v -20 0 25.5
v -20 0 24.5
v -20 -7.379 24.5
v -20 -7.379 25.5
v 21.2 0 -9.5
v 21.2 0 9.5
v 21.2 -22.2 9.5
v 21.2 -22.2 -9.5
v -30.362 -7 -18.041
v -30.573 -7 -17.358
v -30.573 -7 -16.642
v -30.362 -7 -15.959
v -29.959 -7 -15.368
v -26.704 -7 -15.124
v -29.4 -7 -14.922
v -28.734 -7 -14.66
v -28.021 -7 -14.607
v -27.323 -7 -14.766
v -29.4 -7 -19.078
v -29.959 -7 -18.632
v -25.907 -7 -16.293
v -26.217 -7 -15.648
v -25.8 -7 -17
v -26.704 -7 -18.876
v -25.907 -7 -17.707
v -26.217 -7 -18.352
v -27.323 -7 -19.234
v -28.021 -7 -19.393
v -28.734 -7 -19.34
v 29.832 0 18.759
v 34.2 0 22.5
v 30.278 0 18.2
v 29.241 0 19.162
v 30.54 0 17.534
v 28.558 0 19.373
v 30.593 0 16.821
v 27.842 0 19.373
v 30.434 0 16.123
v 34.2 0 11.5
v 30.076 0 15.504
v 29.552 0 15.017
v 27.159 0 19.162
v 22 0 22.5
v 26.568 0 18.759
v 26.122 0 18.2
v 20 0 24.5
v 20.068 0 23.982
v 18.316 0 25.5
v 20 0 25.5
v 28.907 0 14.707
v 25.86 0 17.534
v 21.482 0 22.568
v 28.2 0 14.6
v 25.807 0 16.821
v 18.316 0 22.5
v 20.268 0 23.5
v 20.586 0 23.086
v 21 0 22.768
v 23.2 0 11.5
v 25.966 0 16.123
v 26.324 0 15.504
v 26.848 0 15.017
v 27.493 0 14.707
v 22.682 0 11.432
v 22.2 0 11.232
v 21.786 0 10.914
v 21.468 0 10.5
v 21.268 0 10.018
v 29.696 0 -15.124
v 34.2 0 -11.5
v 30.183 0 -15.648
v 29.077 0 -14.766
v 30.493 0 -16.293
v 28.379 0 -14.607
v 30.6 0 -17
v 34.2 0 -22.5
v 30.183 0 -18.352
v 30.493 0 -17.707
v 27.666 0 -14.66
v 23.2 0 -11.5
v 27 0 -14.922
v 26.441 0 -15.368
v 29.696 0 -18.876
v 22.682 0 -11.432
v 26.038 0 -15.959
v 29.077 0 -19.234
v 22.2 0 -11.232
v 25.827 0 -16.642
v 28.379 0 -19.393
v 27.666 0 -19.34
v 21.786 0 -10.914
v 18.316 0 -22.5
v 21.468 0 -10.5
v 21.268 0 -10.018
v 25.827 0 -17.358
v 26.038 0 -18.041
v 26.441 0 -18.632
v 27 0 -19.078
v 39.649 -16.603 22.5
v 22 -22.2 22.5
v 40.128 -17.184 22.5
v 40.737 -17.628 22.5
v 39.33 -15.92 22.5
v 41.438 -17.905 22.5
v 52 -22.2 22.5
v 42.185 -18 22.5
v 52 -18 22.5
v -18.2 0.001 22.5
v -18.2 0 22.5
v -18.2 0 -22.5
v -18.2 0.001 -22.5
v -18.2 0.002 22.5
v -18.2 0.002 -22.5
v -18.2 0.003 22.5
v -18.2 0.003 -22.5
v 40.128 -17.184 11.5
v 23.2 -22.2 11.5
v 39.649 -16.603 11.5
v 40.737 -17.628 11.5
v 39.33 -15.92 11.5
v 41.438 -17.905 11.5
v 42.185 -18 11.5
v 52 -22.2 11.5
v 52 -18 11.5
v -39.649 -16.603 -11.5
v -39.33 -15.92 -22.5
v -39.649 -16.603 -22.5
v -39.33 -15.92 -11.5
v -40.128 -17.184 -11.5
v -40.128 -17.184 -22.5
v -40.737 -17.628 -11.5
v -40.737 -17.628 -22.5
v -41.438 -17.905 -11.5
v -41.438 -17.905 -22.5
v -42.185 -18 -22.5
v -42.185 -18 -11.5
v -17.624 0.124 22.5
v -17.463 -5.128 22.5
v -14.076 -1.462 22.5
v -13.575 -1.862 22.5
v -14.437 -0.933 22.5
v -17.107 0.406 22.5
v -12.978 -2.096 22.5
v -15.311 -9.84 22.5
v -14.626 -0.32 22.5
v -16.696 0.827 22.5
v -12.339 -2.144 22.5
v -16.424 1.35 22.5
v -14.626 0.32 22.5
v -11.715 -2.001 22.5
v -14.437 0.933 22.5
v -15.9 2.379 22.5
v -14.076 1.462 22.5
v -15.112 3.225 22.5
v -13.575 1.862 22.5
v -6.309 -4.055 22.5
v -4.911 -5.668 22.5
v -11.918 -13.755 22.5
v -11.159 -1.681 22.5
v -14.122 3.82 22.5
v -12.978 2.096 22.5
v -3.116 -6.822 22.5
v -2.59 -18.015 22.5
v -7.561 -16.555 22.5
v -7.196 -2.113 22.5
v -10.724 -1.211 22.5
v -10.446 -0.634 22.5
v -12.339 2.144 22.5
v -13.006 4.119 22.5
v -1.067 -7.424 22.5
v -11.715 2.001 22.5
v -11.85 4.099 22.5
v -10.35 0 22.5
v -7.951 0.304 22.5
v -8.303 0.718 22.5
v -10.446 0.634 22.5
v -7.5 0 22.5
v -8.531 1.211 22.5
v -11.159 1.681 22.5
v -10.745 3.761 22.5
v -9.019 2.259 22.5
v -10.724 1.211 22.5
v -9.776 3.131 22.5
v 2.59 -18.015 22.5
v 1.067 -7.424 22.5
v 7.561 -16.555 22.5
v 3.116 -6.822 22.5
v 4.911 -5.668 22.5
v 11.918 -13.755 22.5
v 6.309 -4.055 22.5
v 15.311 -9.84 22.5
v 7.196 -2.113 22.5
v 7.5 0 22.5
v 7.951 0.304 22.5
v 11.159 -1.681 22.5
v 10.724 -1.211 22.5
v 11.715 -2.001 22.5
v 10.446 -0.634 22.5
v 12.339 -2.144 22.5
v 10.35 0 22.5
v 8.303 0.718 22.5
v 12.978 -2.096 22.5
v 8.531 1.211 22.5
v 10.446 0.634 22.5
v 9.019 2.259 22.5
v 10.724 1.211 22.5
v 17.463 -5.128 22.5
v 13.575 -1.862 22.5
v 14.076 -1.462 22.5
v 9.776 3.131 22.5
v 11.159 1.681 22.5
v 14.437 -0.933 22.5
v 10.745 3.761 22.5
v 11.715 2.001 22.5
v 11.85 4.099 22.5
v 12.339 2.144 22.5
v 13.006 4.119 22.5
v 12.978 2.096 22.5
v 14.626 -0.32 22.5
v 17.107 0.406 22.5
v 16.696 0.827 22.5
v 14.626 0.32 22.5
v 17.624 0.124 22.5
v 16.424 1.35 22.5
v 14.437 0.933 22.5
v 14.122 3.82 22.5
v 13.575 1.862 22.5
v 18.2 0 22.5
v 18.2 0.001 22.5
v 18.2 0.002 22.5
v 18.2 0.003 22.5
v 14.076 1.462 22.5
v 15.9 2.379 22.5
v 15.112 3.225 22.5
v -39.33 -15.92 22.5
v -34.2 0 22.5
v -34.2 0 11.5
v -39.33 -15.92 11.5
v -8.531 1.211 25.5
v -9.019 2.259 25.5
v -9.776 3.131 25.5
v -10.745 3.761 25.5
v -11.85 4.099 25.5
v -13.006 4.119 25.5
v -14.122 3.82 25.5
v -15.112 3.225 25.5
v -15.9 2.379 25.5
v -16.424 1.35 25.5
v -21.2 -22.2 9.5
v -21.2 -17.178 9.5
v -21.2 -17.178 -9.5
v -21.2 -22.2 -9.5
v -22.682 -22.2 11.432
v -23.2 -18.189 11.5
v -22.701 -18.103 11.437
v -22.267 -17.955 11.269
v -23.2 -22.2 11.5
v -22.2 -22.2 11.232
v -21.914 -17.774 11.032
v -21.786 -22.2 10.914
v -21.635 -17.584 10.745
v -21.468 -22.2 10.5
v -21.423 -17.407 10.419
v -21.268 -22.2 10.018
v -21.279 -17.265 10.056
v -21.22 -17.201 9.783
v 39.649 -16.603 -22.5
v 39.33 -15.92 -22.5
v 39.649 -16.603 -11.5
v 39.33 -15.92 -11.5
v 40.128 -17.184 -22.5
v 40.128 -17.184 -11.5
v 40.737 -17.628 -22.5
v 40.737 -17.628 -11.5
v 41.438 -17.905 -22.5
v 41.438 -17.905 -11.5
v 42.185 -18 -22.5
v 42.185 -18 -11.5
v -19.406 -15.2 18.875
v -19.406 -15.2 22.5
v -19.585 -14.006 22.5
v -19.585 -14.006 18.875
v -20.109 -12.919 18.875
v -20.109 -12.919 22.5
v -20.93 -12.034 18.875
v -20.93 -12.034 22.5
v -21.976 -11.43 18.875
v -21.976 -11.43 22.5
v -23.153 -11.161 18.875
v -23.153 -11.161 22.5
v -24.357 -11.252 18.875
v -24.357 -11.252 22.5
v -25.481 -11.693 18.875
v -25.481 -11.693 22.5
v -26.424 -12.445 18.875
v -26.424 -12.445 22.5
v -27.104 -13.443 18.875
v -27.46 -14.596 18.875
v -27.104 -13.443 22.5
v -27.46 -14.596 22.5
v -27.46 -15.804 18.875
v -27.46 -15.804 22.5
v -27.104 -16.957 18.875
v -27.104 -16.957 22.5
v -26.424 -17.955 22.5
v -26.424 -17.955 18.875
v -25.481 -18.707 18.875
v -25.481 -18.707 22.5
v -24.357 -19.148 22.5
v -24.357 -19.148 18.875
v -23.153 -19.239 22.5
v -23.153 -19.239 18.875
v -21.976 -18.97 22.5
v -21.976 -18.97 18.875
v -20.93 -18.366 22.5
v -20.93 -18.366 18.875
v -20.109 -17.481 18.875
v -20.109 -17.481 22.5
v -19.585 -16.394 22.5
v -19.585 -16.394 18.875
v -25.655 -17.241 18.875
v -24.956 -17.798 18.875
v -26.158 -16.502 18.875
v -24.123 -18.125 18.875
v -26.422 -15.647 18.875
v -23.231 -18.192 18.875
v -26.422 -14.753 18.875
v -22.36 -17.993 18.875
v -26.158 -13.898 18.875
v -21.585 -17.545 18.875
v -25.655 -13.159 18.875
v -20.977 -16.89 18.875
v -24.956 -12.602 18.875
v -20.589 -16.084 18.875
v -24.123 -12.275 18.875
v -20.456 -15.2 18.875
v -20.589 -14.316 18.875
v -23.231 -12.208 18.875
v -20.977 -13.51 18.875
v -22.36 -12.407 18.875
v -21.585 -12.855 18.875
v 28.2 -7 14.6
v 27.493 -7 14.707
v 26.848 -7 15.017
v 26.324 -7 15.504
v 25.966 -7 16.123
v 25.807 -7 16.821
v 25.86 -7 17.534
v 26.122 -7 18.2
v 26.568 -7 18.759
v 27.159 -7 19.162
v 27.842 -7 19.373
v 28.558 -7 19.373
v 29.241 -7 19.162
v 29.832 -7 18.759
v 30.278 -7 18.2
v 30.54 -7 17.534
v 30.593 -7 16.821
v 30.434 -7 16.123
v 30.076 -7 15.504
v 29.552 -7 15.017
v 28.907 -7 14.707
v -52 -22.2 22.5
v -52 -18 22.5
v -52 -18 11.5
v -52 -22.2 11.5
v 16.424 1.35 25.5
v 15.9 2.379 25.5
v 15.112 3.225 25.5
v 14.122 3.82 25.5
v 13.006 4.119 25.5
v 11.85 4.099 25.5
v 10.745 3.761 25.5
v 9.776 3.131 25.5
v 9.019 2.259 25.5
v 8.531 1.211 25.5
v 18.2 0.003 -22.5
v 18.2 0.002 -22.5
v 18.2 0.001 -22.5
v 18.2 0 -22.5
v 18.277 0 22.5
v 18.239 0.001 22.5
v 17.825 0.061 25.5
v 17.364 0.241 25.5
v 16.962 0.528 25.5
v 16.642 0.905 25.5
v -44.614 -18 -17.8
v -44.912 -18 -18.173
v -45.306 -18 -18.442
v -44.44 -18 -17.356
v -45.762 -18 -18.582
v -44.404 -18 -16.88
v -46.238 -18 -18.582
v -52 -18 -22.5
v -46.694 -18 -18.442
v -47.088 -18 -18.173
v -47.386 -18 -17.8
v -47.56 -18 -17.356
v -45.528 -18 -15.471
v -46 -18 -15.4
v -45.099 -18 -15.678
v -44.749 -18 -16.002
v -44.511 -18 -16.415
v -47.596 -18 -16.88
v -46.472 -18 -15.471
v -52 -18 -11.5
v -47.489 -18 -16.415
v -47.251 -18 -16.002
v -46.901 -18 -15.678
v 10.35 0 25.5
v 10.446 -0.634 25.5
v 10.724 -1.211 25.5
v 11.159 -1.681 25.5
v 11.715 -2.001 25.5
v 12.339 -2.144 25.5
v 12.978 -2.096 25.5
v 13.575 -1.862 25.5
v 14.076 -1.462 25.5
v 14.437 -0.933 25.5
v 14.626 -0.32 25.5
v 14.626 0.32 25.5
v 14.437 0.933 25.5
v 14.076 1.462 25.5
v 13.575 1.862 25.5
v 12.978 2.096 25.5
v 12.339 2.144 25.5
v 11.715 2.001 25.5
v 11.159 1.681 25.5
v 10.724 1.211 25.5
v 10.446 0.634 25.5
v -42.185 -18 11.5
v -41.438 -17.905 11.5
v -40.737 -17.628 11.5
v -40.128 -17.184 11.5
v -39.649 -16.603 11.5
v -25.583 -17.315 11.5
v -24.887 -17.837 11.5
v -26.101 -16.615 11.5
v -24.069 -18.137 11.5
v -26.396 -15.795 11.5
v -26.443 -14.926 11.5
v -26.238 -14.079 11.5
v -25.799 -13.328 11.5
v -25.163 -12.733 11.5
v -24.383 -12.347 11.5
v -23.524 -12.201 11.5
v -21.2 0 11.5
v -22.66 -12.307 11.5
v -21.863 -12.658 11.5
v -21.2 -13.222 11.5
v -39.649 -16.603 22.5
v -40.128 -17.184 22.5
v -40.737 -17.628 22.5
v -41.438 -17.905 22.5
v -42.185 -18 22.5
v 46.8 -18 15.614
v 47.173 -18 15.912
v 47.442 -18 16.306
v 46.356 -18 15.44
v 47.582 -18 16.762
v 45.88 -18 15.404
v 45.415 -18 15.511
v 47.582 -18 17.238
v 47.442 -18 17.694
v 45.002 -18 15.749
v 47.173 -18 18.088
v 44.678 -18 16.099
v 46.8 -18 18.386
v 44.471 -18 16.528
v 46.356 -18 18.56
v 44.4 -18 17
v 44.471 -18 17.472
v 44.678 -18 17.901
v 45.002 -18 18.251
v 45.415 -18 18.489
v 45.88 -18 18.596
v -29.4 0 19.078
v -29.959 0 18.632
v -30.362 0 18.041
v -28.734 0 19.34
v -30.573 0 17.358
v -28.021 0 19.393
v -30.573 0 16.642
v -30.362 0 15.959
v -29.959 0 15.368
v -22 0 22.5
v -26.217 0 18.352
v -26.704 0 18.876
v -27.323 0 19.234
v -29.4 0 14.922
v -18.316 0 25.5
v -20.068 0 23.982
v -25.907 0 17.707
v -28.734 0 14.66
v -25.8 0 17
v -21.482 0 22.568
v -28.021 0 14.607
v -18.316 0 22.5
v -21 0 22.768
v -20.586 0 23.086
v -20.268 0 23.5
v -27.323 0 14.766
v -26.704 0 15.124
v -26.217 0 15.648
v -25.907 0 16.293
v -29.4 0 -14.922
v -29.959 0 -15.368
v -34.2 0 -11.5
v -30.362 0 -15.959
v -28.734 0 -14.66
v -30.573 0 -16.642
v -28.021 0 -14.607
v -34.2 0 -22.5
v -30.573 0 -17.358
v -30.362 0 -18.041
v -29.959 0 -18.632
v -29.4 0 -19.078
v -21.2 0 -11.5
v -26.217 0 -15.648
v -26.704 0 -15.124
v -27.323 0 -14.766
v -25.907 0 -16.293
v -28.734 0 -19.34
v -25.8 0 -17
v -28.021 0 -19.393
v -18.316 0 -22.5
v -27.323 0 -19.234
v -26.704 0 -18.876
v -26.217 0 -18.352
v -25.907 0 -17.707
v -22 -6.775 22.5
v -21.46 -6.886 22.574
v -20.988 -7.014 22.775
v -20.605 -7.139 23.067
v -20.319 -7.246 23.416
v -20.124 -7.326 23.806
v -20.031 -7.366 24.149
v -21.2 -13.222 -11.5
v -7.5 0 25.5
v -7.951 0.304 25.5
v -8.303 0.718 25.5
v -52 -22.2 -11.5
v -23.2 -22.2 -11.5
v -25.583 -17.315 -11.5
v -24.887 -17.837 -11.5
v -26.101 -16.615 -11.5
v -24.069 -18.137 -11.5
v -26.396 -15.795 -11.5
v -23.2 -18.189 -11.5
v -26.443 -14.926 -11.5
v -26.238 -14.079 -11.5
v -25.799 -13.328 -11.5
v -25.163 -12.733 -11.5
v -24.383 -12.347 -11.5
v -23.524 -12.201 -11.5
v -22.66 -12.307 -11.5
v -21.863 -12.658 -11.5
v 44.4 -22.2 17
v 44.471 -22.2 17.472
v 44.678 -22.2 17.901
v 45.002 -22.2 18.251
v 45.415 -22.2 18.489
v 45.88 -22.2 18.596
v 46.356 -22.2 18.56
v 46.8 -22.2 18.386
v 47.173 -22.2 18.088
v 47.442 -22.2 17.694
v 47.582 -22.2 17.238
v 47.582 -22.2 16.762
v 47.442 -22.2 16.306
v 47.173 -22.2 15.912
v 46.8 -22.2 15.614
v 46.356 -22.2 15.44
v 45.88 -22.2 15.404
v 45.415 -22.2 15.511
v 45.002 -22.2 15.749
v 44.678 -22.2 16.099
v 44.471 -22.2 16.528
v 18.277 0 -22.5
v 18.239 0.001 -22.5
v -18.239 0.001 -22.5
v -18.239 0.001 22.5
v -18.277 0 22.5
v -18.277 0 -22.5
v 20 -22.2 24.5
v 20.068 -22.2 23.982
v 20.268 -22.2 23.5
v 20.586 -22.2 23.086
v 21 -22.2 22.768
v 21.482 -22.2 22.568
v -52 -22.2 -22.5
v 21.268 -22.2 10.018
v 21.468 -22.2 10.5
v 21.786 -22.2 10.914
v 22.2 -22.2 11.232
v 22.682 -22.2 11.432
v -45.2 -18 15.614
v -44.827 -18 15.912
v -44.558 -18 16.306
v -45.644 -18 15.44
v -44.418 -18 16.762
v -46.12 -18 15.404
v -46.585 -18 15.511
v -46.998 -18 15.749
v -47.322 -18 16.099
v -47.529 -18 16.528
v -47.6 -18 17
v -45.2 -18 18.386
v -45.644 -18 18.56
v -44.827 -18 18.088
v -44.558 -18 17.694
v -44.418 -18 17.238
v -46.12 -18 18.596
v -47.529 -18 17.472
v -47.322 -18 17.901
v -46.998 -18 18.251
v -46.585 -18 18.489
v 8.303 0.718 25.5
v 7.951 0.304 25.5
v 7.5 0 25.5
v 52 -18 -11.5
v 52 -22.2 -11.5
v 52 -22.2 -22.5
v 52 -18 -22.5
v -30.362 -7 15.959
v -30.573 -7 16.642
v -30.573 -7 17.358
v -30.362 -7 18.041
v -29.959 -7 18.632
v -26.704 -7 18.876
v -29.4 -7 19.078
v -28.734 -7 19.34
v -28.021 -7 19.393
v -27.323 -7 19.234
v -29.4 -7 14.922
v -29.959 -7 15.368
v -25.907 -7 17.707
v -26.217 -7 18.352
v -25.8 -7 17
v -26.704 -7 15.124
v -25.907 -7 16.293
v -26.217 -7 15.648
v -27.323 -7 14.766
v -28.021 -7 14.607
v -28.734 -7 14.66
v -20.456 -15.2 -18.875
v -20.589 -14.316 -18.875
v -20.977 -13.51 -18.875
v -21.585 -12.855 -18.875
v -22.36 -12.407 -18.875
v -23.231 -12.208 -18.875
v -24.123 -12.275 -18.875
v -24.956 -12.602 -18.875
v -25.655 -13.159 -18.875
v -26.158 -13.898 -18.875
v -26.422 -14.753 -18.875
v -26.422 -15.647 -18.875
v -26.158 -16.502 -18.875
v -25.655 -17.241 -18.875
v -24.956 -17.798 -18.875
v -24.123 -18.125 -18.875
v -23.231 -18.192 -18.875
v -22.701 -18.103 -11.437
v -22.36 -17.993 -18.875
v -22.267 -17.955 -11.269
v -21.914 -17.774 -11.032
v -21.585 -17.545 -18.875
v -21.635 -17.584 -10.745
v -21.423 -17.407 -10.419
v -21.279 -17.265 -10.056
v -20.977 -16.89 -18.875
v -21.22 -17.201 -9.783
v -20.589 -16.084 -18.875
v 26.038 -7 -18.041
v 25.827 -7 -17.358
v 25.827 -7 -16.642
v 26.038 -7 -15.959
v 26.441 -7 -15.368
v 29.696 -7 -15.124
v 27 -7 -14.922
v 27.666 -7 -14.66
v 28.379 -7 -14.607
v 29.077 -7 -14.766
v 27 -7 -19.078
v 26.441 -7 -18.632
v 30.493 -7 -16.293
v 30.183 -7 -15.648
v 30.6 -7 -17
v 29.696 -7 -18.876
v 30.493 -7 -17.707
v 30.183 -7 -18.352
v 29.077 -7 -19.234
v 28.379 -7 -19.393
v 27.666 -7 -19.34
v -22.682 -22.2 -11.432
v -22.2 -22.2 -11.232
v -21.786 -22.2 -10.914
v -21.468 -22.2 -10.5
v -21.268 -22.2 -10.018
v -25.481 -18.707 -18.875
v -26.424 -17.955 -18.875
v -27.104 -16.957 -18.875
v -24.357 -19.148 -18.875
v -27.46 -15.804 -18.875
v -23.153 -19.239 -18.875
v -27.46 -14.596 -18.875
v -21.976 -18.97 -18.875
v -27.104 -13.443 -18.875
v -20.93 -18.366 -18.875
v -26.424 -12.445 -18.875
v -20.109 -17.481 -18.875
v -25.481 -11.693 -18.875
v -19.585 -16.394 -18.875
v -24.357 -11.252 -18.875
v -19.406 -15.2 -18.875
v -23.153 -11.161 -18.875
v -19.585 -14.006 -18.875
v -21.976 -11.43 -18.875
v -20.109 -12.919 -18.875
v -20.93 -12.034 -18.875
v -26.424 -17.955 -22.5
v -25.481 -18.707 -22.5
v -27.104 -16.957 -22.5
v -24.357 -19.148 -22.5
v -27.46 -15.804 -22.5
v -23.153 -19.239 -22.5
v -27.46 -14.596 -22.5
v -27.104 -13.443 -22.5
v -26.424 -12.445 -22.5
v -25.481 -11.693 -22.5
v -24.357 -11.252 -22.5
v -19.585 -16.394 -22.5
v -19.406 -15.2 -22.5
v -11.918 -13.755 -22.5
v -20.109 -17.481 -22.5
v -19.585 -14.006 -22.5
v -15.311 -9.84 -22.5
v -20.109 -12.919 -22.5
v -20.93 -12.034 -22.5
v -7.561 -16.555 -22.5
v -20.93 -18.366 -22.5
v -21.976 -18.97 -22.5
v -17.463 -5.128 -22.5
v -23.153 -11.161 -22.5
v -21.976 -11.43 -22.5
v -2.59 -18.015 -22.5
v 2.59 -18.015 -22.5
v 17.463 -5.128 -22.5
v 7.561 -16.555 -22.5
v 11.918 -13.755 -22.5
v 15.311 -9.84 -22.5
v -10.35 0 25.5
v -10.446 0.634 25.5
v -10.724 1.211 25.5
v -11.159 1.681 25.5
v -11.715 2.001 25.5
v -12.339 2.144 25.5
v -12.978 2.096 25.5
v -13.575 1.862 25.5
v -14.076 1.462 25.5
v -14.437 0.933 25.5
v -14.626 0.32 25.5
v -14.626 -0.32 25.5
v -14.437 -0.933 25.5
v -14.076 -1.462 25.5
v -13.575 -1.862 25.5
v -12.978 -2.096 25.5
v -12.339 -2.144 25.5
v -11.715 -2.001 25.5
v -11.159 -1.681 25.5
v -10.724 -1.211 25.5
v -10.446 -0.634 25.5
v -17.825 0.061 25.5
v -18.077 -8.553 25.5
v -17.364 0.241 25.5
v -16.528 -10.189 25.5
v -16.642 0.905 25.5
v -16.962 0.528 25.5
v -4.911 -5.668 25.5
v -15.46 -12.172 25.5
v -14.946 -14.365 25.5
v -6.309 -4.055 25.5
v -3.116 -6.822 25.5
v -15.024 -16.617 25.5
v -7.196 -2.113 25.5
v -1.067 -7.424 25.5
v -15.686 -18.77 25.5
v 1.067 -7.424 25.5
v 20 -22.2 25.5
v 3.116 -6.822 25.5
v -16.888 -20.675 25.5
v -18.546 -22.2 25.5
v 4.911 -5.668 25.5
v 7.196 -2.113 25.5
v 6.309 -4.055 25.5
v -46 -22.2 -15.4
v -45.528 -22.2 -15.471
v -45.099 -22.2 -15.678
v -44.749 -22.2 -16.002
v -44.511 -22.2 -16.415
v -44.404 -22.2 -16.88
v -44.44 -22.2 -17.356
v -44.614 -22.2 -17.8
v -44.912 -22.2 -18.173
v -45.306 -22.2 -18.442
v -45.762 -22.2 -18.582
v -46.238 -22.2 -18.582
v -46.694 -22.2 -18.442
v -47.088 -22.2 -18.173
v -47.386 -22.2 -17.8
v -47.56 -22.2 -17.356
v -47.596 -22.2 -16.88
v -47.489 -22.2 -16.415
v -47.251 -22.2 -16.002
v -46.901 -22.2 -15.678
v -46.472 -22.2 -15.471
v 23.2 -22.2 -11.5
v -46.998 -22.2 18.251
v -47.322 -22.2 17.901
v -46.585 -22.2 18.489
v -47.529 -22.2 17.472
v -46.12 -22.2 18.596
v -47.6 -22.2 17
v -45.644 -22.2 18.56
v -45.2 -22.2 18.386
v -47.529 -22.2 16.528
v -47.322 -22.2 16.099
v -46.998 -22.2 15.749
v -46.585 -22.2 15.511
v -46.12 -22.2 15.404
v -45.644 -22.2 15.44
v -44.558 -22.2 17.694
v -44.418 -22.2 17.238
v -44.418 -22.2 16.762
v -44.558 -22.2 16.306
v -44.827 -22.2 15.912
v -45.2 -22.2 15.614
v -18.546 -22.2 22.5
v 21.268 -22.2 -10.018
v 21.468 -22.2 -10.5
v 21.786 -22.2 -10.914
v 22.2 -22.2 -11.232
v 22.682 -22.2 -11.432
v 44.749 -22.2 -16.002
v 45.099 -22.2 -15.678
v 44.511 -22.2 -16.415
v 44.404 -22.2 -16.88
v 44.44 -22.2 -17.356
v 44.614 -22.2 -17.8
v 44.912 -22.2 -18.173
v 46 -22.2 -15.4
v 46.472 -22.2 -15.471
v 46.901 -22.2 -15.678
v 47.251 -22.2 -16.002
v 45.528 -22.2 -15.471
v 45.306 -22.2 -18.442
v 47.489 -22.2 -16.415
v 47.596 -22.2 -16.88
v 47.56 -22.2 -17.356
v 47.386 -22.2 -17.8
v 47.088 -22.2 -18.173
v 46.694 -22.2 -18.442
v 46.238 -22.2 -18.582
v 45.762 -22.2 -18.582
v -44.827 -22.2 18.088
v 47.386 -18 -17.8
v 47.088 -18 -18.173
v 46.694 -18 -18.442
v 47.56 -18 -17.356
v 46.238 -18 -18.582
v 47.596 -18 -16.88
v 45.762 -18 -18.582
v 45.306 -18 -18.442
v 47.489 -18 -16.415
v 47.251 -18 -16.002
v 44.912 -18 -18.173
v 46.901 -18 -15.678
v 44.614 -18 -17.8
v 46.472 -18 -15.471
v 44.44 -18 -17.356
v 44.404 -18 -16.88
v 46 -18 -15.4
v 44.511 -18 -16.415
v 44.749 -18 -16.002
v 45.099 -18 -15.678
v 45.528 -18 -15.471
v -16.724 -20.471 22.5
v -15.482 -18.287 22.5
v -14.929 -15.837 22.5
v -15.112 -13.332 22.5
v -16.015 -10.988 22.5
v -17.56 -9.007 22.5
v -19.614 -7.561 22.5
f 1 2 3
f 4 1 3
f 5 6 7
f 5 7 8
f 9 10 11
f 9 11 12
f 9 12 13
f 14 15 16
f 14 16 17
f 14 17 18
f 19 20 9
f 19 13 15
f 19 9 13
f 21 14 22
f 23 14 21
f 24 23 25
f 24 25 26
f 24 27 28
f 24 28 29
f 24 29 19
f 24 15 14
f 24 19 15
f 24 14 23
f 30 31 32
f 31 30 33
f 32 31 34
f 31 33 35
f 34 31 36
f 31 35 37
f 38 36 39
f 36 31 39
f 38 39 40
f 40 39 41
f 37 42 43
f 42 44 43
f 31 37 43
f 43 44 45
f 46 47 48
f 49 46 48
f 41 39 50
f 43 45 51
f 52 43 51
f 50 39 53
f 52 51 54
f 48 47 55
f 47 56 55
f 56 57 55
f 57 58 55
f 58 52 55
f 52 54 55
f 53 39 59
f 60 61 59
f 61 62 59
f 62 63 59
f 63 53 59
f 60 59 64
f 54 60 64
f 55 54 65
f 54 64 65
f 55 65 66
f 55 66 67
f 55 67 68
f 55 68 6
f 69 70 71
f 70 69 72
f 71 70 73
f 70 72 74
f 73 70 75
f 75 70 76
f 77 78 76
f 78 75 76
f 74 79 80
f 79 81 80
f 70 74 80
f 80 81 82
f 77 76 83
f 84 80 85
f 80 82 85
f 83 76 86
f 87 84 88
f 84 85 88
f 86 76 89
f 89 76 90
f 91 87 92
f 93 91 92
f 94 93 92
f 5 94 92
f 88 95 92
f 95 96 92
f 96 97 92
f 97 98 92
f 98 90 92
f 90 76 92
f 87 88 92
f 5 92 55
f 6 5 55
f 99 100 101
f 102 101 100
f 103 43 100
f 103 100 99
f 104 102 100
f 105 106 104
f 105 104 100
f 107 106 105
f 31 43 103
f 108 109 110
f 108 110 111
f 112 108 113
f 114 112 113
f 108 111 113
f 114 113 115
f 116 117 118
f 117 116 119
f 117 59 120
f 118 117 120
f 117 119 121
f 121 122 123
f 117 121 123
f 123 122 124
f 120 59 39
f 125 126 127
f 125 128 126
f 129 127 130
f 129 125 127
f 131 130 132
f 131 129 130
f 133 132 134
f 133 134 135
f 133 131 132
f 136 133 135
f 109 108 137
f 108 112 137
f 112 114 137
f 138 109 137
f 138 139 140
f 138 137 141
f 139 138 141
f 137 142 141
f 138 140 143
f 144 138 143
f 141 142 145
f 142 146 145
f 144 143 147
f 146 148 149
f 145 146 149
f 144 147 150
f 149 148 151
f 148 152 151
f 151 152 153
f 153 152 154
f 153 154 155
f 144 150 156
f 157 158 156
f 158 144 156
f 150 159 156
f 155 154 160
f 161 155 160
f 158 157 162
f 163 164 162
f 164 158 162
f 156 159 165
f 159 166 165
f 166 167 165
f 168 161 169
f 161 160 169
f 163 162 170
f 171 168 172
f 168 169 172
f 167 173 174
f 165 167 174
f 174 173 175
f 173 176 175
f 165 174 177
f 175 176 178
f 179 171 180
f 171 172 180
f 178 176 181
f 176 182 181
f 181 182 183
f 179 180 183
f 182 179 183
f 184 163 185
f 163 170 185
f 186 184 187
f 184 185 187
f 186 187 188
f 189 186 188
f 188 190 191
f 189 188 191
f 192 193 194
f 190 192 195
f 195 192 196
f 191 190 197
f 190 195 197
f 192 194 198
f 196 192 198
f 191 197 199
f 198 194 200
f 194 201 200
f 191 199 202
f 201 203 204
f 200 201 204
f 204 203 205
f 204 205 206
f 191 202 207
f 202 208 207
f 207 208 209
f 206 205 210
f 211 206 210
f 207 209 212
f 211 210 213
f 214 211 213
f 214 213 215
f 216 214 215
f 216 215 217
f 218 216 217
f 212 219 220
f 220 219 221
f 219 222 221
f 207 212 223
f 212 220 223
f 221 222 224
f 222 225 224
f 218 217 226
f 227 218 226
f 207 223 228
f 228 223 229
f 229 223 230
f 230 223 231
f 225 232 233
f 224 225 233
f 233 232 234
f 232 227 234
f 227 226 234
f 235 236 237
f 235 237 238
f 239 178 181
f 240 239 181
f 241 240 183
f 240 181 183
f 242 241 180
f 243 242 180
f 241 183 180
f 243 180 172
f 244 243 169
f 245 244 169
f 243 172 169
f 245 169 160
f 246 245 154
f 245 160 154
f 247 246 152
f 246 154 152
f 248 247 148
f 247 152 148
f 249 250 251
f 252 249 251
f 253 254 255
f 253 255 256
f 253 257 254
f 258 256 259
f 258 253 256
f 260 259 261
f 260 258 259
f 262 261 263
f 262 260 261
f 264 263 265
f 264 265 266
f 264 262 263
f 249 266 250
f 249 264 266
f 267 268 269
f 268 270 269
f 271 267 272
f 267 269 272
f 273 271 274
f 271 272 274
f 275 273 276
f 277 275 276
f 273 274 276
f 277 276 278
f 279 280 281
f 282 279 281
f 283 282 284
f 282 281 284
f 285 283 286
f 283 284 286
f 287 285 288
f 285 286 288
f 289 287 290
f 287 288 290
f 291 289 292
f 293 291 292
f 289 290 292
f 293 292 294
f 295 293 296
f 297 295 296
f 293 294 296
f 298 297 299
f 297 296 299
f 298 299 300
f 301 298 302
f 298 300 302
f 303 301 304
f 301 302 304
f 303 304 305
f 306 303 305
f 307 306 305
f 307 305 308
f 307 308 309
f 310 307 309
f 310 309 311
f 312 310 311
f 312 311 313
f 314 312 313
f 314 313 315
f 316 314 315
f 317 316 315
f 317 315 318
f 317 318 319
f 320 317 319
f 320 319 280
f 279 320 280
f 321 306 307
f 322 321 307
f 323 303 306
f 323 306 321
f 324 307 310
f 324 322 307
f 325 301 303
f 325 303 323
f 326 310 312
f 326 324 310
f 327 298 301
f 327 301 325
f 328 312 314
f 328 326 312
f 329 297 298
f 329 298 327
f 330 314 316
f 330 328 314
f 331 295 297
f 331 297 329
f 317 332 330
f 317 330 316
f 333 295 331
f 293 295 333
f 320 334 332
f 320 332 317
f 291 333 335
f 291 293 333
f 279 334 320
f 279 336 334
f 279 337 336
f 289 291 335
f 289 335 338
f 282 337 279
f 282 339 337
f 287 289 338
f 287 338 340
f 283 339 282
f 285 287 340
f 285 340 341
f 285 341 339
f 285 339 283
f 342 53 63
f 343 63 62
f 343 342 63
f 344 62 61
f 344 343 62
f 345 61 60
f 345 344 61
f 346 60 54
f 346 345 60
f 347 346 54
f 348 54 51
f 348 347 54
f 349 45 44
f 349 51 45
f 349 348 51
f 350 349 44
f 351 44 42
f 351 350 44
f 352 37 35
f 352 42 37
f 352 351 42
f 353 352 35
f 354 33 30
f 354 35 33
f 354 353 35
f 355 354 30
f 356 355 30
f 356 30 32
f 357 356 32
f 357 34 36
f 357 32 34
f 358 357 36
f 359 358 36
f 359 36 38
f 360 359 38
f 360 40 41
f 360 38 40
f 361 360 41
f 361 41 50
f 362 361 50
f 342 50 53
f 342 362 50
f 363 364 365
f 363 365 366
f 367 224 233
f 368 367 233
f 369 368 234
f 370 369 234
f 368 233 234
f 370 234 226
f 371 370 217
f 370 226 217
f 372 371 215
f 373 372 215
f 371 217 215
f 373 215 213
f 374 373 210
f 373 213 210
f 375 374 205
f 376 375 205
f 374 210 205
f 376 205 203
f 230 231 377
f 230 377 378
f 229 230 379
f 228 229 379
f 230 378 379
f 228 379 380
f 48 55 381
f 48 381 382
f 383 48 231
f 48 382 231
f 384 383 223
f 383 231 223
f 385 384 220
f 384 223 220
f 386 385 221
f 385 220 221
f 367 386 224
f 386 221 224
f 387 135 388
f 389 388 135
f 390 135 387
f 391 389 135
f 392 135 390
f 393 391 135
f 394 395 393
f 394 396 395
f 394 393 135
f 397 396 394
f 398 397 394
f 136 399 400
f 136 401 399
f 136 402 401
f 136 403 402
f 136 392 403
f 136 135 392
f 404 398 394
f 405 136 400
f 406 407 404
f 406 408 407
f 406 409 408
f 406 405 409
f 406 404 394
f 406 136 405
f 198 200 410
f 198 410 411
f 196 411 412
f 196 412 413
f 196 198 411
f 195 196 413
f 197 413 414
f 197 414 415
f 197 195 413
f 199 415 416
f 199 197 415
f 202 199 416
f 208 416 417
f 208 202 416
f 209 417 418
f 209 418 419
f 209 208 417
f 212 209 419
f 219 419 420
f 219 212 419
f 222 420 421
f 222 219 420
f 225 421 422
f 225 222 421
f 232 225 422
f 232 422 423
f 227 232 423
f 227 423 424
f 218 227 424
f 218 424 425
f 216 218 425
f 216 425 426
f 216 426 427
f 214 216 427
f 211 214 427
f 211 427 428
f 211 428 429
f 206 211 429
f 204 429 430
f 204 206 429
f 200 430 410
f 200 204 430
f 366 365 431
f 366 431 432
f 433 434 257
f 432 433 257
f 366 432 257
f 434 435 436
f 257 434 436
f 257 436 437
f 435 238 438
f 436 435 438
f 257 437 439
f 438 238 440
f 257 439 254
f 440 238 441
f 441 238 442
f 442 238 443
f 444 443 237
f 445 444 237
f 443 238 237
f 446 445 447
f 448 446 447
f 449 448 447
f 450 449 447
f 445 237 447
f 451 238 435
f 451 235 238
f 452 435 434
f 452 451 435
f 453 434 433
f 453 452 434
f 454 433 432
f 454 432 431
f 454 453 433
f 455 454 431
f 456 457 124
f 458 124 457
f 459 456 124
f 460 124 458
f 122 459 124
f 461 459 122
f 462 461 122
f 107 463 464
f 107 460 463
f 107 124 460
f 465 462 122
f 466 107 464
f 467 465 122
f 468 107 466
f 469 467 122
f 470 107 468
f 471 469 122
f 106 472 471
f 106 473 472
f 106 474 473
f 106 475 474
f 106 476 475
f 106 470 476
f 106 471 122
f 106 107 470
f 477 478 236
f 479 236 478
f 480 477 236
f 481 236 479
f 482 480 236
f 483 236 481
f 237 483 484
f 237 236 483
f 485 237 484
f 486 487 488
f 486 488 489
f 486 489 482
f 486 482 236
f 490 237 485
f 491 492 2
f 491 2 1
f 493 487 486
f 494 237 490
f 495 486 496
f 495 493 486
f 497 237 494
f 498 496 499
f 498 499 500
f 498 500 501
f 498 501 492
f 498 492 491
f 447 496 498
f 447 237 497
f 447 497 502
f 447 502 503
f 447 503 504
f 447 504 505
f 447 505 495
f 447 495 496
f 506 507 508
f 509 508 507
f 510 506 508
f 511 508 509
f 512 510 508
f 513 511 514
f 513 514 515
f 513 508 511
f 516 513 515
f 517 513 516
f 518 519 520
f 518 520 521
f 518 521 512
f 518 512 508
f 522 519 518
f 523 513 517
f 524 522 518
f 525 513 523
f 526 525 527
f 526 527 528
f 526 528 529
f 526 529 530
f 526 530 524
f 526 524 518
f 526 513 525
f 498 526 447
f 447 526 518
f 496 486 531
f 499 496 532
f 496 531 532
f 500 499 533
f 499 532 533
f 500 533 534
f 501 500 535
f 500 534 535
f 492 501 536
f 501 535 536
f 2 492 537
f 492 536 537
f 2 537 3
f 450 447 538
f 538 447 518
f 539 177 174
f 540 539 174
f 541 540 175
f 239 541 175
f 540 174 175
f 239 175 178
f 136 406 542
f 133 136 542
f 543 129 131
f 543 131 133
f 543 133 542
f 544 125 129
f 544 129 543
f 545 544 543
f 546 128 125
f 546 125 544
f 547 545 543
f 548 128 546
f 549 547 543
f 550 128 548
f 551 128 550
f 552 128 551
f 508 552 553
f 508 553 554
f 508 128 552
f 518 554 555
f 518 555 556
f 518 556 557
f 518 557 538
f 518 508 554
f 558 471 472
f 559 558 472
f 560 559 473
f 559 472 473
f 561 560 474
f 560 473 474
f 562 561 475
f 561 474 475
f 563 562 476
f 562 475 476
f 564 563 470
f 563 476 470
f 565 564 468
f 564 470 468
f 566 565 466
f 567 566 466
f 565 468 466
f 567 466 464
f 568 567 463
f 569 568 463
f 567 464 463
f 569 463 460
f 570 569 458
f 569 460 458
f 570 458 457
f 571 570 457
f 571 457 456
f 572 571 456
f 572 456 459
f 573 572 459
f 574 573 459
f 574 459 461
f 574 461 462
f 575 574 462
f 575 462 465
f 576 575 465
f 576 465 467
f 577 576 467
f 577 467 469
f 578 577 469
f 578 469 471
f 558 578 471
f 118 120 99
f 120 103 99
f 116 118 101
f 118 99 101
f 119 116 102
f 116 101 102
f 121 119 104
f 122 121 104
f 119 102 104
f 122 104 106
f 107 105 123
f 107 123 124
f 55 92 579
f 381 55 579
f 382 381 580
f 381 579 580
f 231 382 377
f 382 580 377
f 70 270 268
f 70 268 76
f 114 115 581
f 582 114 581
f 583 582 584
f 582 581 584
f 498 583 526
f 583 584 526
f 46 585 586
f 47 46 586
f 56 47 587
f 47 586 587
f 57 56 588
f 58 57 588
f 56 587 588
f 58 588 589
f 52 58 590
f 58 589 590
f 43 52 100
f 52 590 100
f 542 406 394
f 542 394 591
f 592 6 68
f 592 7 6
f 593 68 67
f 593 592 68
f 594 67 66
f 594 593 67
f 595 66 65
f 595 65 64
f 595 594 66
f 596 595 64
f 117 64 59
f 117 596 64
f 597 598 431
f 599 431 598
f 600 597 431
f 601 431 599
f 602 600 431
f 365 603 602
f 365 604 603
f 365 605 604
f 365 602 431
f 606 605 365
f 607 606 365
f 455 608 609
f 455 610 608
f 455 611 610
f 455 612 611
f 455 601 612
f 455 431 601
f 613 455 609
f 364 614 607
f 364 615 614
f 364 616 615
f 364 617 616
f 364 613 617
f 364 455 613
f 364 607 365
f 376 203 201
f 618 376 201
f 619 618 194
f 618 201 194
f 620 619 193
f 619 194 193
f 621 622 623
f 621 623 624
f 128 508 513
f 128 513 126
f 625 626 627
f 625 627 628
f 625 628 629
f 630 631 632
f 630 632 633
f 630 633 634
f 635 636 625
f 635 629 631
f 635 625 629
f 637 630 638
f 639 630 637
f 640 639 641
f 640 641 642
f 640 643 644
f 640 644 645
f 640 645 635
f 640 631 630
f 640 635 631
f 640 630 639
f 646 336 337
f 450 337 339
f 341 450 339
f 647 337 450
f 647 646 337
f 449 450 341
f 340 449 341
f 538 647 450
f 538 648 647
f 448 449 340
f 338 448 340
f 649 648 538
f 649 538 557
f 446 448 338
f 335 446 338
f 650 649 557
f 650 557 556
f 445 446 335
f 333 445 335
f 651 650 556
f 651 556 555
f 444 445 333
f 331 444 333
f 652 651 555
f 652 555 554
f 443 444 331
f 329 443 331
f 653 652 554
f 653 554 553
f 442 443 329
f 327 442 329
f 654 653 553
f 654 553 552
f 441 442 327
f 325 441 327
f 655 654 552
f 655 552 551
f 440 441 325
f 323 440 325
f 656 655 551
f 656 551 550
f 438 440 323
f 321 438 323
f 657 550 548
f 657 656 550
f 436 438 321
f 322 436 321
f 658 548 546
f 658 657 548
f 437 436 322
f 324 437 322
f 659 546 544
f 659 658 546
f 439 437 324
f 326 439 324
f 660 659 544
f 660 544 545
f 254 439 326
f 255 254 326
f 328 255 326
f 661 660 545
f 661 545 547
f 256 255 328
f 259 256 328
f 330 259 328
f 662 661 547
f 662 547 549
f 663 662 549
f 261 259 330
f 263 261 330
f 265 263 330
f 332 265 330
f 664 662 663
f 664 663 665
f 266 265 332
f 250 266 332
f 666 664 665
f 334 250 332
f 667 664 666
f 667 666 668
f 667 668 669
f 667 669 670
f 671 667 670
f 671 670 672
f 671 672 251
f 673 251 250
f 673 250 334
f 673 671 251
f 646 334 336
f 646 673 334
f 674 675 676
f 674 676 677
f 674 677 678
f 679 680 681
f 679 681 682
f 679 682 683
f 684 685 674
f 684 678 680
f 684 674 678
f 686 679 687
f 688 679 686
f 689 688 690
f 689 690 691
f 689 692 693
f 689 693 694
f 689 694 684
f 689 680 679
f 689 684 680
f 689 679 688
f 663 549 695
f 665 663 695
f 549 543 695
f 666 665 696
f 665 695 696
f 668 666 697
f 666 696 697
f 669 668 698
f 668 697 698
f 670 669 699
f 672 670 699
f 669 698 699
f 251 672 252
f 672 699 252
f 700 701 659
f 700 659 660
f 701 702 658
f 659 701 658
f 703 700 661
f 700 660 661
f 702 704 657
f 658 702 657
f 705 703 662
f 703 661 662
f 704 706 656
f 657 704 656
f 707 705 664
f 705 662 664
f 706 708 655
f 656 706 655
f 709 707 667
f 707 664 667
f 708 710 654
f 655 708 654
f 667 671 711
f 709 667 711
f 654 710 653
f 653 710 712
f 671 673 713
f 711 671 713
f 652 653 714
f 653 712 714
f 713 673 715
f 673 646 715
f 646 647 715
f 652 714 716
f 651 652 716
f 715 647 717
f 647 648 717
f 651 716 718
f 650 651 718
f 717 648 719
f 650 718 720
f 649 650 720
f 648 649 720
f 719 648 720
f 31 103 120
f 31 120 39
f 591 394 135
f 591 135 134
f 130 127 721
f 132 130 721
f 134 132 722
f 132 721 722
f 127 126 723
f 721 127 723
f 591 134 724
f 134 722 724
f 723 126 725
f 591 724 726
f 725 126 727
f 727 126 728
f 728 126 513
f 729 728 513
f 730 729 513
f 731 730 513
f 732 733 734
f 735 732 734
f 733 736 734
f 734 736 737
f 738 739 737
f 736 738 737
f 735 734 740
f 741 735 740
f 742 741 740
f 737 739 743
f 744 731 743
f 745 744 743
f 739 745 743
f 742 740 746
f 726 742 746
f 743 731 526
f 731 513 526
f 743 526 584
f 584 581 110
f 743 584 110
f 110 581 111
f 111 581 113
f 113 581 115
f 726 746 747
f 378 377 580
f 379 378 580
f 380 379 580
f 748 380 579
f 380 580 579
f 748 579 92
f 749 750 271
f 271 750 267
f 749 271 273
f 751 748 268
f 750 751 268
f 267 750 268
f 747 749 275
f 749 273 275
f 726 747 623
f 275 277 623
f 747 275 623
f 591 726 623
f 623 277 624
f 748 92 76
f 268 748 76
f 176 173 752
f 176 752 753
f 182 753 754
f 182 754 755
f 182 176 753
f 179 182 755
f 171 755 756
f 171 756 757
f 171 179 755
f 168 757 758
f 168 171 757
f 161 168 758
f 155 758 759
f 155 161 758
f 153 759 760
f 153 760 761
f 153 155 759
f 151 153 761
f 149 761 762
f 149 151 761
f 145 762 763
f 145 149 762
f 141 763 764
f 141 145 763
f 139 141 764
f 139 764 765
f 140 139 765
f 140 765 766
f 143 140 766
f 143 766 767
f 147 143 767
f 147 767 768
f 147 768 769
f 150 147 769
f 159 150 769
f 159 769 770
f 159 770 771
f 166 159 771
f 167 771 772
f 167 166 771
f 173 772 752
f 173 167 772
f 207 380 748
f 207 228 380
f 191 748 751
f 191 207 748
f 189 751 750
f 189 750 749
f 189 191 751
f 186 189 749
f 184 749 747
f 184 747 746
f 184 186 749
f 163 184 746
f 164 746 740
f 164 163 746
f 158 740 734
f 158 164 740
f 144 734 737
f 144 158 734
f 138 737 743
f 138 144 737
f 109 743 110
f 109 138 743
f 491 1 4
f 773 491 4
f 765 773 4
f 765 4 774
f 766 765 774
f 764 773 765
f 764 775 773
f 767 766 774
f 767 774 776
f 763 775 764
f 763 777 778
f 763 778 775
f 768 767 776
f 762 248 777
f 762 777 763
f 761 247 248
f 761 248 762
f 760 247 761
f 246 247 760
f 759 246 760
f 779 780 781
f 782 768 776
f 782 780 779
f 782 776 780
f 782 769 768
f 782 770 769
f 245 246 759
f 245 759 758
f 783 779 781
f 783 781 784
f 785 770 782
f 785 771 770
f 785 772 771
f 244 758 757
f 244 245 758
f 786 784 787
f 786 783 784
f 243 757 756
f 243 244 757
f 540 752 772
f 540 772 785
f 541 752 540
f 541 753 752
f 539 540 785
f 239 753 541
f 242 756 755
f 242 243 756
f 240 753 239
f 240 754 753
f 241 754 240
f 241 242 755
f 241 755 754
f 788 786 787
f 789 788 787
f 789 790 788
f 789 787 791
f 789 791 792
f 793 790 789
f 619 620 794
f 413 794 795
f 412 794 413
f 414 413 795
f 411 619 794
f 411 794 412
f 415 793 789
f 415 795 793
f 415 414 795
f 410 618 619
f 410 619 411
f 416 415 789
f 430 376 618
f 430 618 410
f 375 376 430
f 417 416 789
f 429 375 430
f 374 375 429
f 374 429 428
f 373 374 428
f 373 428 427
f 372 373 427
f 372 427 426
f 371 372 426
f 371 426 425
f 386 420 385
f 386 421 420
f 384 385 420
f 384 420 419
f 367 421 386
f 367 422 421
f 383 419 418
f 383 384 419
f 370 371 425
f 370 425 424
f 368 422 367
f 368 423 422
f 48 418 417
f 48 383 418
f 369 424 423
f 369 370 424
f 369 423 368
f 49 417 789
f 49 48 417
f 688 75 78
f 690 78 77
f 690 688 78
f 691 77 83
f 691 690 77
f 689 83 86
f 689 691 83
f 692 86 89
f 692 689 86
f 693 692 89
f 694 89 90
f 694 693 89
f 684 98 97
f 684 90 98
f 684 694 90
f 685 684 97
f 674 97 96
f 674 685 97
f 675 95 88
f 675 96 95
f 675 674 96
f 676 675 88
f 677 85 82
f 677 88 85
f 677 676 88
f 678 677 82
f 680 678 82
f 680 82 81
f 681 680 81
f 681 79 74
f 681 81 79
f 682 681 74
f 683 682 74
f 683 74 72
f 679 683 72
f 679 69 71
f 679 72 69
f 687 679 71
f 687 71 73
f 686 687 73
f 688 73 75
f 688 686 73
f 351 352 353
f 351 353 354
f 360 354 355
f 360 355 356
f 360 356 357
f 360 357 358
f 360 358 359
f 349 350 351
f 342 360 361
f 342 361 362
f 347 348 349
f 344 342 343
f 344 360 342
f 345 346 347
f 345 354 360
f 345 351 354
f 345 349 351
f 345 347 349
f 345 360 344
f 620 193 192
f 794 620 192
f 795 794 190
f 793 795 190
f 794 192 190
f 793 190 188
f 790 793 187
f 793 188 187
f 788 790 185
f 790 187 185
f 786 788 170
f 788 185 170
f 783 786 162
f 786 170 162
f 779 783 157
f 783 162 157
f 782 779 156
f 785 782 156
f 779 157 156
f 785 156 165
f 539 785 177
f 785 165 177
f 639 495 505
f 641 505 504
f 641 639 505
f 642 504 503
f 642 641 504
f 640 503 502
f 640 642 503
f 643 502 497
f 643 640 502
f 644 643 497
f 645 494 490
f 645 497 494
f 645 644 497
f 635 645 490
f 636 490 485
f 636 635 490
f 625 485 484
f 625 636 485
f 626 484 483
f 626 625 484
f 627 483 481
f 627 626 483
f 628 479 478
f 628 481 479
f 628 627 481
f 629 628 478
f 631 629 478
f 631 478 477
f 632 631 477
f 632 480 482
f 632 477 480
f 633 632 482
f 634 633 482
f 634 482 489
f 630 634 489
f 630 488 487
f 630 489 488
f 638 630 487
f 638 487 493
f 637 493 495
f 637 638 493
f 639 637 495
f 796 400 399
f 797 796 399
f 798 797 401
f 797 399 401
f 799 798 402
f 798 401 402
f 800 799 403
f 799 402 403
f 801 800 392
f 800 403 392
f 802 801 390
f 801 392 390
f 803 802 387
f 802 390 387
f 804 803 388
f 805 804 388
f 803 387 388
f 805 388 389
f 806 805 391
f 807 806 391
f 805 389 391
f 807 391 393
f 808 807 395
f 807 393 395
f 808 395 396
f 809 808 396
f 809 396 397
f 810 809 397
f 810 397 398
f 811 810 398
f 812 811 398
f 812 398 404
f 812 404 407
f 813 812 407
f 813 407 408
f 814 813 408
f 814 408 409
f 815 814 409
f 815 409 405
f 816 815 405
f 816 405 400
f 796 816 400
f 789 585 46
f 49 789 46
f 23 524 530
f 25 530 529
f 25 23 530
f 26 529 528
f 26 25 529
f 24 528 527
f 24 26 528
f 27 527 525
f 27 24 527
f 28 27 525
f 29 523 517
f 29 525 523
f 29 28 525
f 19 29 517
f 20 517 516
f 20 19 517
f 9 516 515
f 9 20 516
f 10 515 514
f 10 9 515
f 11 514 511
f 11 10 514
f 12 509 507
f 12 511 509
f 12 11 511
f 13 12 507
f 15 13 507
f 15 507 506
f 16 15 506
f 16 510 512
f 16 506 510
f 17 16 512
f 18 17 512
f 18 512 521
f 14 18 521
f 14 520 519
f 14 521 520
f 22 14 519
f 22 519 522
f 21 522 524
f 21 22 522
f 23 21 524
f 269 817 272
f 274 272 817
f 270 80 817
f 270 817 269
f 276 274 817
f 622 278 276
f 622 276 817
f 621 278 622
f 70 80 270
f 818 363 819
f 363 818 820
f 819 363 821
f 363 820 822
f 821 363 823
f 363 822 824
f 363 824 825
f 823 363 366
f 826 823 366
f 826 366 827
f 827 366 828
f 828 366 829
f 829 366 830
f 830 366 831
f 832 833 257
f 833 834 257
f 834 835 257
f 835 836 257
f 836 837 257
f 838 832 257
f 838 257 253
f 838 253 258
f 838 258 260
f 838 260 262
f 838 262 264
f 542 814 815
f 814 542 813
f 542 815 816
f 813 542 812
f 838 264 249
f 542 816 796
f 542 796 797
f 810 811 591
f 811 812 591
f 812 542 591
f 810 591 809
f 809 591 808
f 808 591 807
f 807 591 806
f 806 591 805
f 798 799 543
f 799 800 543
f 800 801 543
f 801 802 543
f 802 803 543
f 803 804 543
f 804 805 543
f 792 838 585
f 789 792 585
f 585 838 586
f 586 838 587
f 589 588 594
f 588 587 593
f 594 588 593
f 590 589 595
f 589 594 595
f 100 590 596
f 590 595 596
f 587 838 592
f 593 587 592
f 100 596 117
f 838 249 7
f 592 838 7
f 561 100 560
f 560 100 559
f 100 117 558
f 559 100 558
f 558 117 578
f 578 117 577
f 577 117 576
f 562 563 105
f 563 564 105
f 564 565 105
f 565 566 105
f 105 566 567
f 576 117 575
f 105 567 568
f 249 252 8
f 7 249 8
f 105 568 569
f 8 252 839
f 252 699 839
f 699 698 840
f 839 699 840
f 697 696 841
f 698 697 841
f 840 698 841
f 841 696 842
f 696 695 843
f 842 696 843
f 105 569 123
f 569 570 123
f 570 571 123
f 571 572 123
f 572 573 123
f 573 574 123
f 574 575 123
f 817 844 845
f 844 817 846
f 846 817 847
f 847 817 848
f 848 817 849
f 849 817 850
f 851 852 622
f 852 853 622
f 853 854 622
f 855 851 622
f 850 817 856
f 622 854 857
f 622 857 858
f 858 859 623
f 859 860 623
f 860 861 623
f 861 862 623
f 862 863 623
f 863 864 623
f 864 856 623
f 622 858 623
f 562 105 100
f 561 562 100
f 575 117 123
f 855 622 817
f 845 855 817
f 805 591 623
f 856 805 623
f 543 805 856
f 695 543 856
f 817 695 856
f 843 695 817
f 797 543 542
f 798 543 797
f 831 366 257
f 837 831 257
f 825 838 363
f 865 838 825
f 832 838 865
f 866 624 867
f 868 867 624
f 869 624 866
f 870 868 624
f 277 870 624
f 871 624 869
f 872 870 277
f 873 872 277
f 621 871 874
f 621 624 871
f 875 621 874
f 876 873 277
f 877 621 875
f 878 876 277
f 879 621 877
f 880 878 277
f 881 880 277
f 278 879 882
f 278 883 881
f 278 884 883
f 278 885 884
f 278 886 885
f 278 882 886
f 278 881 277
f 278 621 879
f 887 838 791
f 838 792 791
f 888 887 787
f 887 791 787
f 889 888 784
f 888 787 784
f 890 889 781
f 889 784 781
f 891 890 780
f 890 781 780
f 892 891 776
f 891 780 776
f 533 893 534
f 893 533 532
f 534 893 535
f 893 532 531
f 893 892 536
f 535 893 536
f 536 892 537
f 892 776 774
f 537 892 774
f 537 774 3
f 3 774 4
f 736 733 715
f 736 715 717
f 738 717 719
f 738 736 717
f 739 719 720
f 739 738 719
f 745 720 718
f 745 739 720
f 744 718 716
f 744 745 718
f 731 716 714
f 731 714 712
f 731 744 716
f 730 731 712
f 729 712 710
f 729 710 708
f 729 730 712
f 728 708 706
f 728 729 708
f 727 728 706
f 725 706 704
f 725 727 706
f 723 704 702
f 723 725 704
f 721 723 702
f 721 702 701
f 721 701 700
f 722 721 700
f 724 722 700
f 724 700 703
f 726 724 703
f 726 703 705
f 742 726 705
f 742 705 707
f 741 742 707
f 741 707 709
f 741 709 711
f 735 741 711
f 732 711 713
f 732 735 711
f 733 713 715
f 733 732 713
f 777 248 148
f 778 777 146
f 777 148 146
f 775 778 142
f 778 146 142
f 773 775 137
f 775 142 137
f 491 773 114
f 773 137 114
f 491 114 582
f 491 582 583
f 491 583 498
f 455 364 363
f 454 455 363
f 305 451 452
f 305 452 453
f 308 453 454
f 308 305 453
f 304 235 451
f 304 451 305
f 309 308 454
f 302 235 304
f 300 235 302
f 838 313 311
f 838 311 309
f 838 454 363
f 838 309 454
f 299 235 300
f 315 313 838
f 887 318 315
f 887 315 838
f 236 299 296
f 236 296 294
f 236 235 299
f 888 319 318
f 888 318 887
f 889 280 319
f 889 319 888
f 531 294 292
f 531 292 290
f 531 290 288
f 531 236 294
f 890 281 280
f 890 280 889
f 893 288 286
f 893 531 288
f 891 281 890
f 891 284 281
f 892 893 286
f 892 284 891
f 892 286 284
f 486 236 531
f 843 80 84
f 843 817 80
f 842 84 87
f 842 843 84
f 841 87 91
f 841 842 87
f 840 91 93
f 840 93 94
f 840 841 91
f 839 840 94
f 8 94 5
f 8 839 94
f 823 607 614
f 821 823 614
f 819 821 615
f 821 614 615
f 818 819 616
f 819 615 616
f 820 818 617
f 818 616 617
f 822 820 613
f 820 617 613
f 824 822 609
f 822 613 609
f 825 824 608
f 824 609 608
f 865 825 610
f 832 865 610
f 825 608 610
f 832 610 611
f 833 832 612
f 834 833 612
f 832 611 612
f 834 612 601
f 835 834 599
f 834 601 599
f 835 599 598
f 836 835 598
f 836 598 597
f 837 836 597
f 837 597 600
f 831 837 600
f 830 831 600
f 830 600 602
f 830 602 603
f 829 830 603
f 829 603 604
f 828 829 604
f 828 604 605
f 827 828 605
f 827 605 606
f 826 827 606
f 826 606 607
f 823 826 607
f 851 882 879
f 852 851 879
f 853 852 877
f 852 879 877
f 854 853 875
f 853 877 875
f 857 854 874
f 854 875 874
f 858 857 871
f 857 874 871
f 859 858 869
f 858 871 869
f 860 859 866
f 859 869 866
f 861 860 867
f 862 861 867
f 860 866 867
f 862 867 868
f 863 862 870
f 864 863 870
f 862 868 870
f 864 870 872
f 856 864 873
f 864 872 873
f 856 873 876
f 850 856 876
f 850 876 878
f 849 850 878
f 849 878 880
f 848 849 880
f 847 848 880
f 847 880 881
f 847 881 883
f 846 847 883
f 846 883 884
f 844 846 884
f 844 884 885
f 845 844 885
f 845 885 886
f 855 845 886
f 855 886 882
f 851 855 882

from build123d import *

# Parameters (mm, degrees)
BOSS_EXTRUDE1_DEPTH        = 22.5
SKETCH2_W                  = 30.8
SKETCH2_H                  = 23
CUT_EXTRUDE1_DEPTH         = 65
SKETCH3_R                  = 1.6
CUT_EXTRUDE2_DEPTH         = 65
SKETCH7_R                  = 2.15
MOTOR_MOUNTING_DEPTH       = 3
SKETCH4_R                  = 4.05
BEARING_HOLE_DEPTH         = 3.625
AXLE_THRU_HOLES_DEPTH      = 71.062333854
AXLE_THRU_HOLES_DEPTH_BACK = 71.062333854
SKETCH5_R                  = 3
FILLET3_R                  = 2
TOP_MOUNT_HOLES_DEPTH      = 63.024914385
TOP_MOUNT_HOLES_DEPTH_BACK = 7
SKETCH6_R                  = 2.4
FILLET4_R                  = 3
FILLET5_START              = 22.5
FILLET5_DEPTH              = 3
FILLET5_START_2            = -13.087721306
FILLET5_2_DEPTH            = 13.087721306
FILLET5_START_3            = -22.2
FILLET5_3_DEPTH            = 9.436583025
FILLET5_4_OUTLINE_R        = 4.05
FILLET5_4_DEPTH            = 2.71686
FILLET5_5_DEPTH            = 3
FILLET5_START_4            = -22.5
FILLET5_6_DEPTH            = 45
CUT_EXTRUDE3_REACH         = 76.168
SKETCH8_R                  = 8.55


with BuildPart() as part:
    # Sketch1 → Boss-Extrude1 (new, symmetric)
    with BuildSketch(Plane.XY):
        with BuildLine():
            Line((-18.2, 0), (-34.2, 0))
            Line((-34.2, 0), (-40, -18))
            Line((-40, -18), (-52, -18))
            Line((-52, -18), (-52, -22.2))
            Line((-52, -22.2), (0, -22.2))
            Line((0, -22.2), (52, -22.2))
            Line((52, -22.2), (52, -18))
            Line((52, -18), (40, -18))
            Line((40, -18), (34.2, 0))
            Line((34.2, 0), (18.2, 0))
            ThreePointArc((18.2, 0), (0, -18.2), (-18.2, 0))
        make_face()
    extrude(amount=BOSS_EXTRUDE1_DEPTH, both=True)

    # Sketch2 → Cut-Extrude1 (cut)
    with BuildSketch(Plane(origin=(0, 0, 0), x_dir=(1, 0, 0), z_dir=(0, 1, 0))):
        with Locations((-36.6, 0)):
            Rectangle(SKETCH2_W, SKETCH2_H)
        with Locations((36.6, 0)):
            Rectangle(SKETCH2_W, SKETCH2_H)
    extrude(amount=-CUT_EXTRUDE1_DEPTH, mode=Mode.SUBTRACT)

    # Sketch3 → Cut-Extrude2 (cut)
    with BuildSketch(Plane(origin=(0, -18, 0), x_dir=(1, 0, 0), z_dir=(0, 1, 0))):
        with Locations(Location((-46, 17, 0), (0, 0, 270))):
            Circle(SKETCH3_R)
        with Locations(Location((46, 17, 0), (0, 0, 270))):
            Circle(SKETCH3_R)
        with Locations(Location((46, -17, 0), (0, 0, 180))):
            Circle(SKETCH3_R)
        with Locations(Location((-46, -17, 0), (0, 0, 180))):
            Circle(SKETCH3_R)
    extrude(amount=-CUT_EXTRUDE2_DEPTH, mode=Mode.SUBTRACT)

    # Sketch7 → Motor-Mounting (add)
    with BuildSketch(Plane.XY.offset(22.5)):
        with BuildLine():
            Line((-7.5, 0), (-8.35, 0))
            ThreePointArc((-8.35, 0), (-12.5, 4.15), (-16.65, 0))
            Line((-16.65, 0), (-18.2, 0))
            Line((-18.2, 0), (-20, 0))
            Line((-20, 0), (-20, -22.2))
            Line((-20, -22.2), (0, -22.2))
            Line((0, -22.2), (20, -22.2))
            Line((20, -22.2), (20, 0))
            Line((20, 0), (18.2, 0))
            Line((18.2, 0), (16.65, 0))
            ThreePointArc((16.65, 0), (12.5, 4.15), (8.35, 0))
            Line((8.35, 0), (7.5, 0))
            ThreePointArc((7.5, 0), (0, -7.5), (-7.5, 0))
        make_face()
        with Locations((-12.5, 0)):
            Circle(SKETCH7_R, mode=Mode.SUBTRACT)
        with Locations(Location((12.5, 0, 0), (0, 0, 180))):
            Circle(SKETCH7_R, mode=Mode.SUBTRACT)
    extrude(amount=MOTOR_MOUNTING_DEPTH)

    # Sketch4 → Bearing-Hole (cut, symmetric)
    with BuildSketch(Plane.XY.offset(22.5)):
        with Locations((-23.455543055, -15.2)):
            Circle(SKETCH4_R)
    bearing_hole = extrude(amount=BEARING_HOLE_DEPTH, both=True, mode=Mode.SUBTRACT)

    # Mirror1: Bearing-Hole across plane
    add(bearing_hole.mirror(Plane.XY), mode=Mode.SUBTRACT)

    # Sketch5 → Axle-Thru-Holes (cut, two sides: drawn at the far end of the back side and taken through both)
    with BuildSketch(Plane.XY.offset(18.875).offset(-AXLE_THRU_HOLES_DEPTH_BACK)):
        with Locations((-23.455543055, -15.2)):
            Circle(SKETCH5_R)
    extrude(amount=AXLE_THRU_HOLES_DEPTH + AXLE_THRU_HOLES_DEPTH_BACK, mode=Mode.SUBTRACT)

    # Fillet3
    fillet3_edges = [part.edges().sort_by_distance(p)[0] for p in [
        (21.2, -11.1, -11.5),
        (21.2, -11.1, 11.5),
        (-21.2, -19.689005249, 11.5),
        (-21.2, -19.689005249, -11.5),
    ]]
    fillet(fillet3_edges, radius=FILLET3_R)

    # Sketch6 → Top-Mount-Holes (cut, two sides: drawn at the far end of the back side and taken through both)
    with BuildSketch(Plane(origin=(0, 0, 0), x_dir=(1, 0, 0), z_dir=(0, 1, 0)).offset(-TOP_MOUNT_HOLES_DEPTH_BACK)):
        with Locations((-28.2, 17)):
            Circle(SKETCH6_R)
        with Locations((28.2, 17)):
            Circle(SKETCH6_R)
        with Locations(Location((28.2, -17, 0), (0, 0, 90))):
            Circle(SKETCH6_R)
        with Locations((-28.2, -17)):
            Circle(SKETCH6_R)
    extrude(amount=TOP_MOUNT_HOLES_DEPTH + TOP_MOUNT_HOLES_DEPTH_BACK, mode=Mode.SUBTRACT)

    # Fillet4
    fillet4_edges = [part.edges().sort_by_distance(p)[0] for p in [
        (40, -18, 17),
        (-40, -18, 17),
        (40, -18, -17),
        (-40, -18, -17),
    ]]
    fillet(fillet4_edges, radius=FILLET4_R)

    # Fillet5: read off the stored shape, not the designer's step
    # Fillet5 outline → Fillet5 (add)
    with BuildSketch(Plane.XY.offset(FILLET5_START)):
        with BuildLine():
            ThreePointArc((-7.5, 0), (-8.14090356, 0.498741958), (-8.530676829, 1.211186842))
            ThreePointArc((-8.530676829, 1.211186842), (-8.395417734, 0.612294391), (-8.35, 0))
            Line((-8.35, 0), (-7.5, 0))
        make_face()
        with BuildLine():
            ThreePointArc((8.530676829, 1.211186842), (8.14090356, 0.498741958), (7.5, 0))
            Line((7.5, 0), (8.35, 0))
            ThreePointArc((8.35, 0), (8.395417734, 0.612294391), (8.530676829, 1.211186842))
        make_face()
    extrude(amount=FILLET5_DEPTH)

    # Fillet5 2 outline → Fillet5 2 (add)
    with BuildSketch(Plane(origin=(0, 0, 0), x_dir=(1, 0, 0), z_dir=(0, 1, 0)).offset(FILLET5_START_2)):
        with BuildLine():
            ThreePointArc((-22, -22.5), (-20.585786438, -23.085786438), (-20, -24.5))
            Line((-20, -24.5), (-20, -22.5))
            Line((-20, -22.5), (-22, -22.5))
        make_face()
        with BuildLine():
            ThreePointArc((20, -24.5), (20.585786438, -23.085786438), (22, -22.5))
            Line((22, -22.5), (20, -22.5))
            Line((20, -22.5), (20, -24.5))
        make_face()
    extrude(amount=FILLET5_2_DEPTH)

    # Fillet5 3 outline → Fillet5 3 (add)
    with BuildSketch(Plane(origin=(0, 0, 0), x_dir=(1, 0, 0), z_dir=(0, 1, 0)).offset(FILLET5_START_3)):
        with BuildLine():
            ThreePointArc((20, -24.5), (20.585786438, -23.085786438), (22, -22.5))
            Line((22, -22.5), (20, -22.5))
            Line((20, -22.5), (20, -24.5))
        make_face()
    extrude(amount=FILLET5_3_DEPTH)

    # Fillet5 4 outline → Fillet5 4 (cut)
    with BuildSketch(Plane.XY.offset(FILLET5_START)):
        with Locations((-23.455543055, -15.2)):
            Circle(FILLET5_4_OUTLINE_R)
    extrude(amount=FILLET5_4_DEPTH, mode=Mode.SUBTRACT)

    # Fillet5 5 outline → Fillet5 5 (add)
    with BuildSketch(Plane.XY.offset(FILLET5_START)):
        with BuildLine():
            ThreePointArc((18.315711478, 0), (17.153991419, 0.371993088), (16.424423193, 1.349593496))
            ThreePointArc((16.424423193, 1.349593496), (16.593217332, 0.684157785), (16.65, 0))
            Line((16.65, 0), (18.315711478, 0))
        make_face()
        with BuildLine():
            Line((-18.315711478, 0), (-16.65, 0))
            ThreePointArc((-16.65, 0), (-16.593217332, 0.684157785), (-16.424423193, 1.349593496))
            ThreePointArc((-16.424423193, 1.349593496), (-17.153991419, 0.371993088), (-18.315711478, 0))
        make_face()
    extrude(amount=FILLET5_5_DEPTH)

    # Fillet5 6 outline → Fillet5 6 (add)
    with BuildSketch(Plane.XY.offset(FILLET5_START_4)):
        with BuildLine():
            Line((18.2, 0), (18.315711478, 0))
            ThreePointArc((18.315711478, 0), (18.257831342, 0.000837703), (18.199999692, 0.00335011))
            ThreePointArc((18.199999692, 0.00335011), (18.199999923, 0.001675055), (18.2, 0))
        make_face()
        with BuildLine():
            Line((-18.315711478, 0), (-18.2, 0))
            ThreePointArc((-18.2, 0), (-18.199999923, 0.001675055), (-18.199999692, 0.00335011))
            ThreePointArc((-18.199999692, 0.00335011), (-18.257831342, 0.000837703), (-18.315711478, 0))
        make_face()
    extrude(amount=FILLET5_6_DEPTH)

    # Cut-Extrude3: up to this face of the body (flat: up to its plane)
    cut_extrude3_end = Plane(part.part.faces().sort_by_distance((-32.525053026, -12.842804107, 22.5))[0])
    # Sketch8 → Cut-Extrude3 (cut, up to the picked face)
    with BuildSketch(Plane.XY.offset(25.5), mode=Mode.PRIVATE) as cut_extrude3_sk1:
        with Locations((-23.455543055, -15.2)):
            Circle(SKETCH8_R)
    cut_extrude3_tool1 = split(extrude(cut_extrude3_sk1.sketch, amount=-CUT_EXTRUDE3_REACH, mode=Mode.PRIVATE), bisect_by=cut_extrude3_end, keep=Keep.BOTH, mode=Mode.PRIVATE)
    add(cut_extrude3_tool1.solids().sort_by(Axis((-23.455543, -15.2, 25.5), (0, 0, -1)))[0], mode=Mode.SUBTRACT)


solid = part.part
